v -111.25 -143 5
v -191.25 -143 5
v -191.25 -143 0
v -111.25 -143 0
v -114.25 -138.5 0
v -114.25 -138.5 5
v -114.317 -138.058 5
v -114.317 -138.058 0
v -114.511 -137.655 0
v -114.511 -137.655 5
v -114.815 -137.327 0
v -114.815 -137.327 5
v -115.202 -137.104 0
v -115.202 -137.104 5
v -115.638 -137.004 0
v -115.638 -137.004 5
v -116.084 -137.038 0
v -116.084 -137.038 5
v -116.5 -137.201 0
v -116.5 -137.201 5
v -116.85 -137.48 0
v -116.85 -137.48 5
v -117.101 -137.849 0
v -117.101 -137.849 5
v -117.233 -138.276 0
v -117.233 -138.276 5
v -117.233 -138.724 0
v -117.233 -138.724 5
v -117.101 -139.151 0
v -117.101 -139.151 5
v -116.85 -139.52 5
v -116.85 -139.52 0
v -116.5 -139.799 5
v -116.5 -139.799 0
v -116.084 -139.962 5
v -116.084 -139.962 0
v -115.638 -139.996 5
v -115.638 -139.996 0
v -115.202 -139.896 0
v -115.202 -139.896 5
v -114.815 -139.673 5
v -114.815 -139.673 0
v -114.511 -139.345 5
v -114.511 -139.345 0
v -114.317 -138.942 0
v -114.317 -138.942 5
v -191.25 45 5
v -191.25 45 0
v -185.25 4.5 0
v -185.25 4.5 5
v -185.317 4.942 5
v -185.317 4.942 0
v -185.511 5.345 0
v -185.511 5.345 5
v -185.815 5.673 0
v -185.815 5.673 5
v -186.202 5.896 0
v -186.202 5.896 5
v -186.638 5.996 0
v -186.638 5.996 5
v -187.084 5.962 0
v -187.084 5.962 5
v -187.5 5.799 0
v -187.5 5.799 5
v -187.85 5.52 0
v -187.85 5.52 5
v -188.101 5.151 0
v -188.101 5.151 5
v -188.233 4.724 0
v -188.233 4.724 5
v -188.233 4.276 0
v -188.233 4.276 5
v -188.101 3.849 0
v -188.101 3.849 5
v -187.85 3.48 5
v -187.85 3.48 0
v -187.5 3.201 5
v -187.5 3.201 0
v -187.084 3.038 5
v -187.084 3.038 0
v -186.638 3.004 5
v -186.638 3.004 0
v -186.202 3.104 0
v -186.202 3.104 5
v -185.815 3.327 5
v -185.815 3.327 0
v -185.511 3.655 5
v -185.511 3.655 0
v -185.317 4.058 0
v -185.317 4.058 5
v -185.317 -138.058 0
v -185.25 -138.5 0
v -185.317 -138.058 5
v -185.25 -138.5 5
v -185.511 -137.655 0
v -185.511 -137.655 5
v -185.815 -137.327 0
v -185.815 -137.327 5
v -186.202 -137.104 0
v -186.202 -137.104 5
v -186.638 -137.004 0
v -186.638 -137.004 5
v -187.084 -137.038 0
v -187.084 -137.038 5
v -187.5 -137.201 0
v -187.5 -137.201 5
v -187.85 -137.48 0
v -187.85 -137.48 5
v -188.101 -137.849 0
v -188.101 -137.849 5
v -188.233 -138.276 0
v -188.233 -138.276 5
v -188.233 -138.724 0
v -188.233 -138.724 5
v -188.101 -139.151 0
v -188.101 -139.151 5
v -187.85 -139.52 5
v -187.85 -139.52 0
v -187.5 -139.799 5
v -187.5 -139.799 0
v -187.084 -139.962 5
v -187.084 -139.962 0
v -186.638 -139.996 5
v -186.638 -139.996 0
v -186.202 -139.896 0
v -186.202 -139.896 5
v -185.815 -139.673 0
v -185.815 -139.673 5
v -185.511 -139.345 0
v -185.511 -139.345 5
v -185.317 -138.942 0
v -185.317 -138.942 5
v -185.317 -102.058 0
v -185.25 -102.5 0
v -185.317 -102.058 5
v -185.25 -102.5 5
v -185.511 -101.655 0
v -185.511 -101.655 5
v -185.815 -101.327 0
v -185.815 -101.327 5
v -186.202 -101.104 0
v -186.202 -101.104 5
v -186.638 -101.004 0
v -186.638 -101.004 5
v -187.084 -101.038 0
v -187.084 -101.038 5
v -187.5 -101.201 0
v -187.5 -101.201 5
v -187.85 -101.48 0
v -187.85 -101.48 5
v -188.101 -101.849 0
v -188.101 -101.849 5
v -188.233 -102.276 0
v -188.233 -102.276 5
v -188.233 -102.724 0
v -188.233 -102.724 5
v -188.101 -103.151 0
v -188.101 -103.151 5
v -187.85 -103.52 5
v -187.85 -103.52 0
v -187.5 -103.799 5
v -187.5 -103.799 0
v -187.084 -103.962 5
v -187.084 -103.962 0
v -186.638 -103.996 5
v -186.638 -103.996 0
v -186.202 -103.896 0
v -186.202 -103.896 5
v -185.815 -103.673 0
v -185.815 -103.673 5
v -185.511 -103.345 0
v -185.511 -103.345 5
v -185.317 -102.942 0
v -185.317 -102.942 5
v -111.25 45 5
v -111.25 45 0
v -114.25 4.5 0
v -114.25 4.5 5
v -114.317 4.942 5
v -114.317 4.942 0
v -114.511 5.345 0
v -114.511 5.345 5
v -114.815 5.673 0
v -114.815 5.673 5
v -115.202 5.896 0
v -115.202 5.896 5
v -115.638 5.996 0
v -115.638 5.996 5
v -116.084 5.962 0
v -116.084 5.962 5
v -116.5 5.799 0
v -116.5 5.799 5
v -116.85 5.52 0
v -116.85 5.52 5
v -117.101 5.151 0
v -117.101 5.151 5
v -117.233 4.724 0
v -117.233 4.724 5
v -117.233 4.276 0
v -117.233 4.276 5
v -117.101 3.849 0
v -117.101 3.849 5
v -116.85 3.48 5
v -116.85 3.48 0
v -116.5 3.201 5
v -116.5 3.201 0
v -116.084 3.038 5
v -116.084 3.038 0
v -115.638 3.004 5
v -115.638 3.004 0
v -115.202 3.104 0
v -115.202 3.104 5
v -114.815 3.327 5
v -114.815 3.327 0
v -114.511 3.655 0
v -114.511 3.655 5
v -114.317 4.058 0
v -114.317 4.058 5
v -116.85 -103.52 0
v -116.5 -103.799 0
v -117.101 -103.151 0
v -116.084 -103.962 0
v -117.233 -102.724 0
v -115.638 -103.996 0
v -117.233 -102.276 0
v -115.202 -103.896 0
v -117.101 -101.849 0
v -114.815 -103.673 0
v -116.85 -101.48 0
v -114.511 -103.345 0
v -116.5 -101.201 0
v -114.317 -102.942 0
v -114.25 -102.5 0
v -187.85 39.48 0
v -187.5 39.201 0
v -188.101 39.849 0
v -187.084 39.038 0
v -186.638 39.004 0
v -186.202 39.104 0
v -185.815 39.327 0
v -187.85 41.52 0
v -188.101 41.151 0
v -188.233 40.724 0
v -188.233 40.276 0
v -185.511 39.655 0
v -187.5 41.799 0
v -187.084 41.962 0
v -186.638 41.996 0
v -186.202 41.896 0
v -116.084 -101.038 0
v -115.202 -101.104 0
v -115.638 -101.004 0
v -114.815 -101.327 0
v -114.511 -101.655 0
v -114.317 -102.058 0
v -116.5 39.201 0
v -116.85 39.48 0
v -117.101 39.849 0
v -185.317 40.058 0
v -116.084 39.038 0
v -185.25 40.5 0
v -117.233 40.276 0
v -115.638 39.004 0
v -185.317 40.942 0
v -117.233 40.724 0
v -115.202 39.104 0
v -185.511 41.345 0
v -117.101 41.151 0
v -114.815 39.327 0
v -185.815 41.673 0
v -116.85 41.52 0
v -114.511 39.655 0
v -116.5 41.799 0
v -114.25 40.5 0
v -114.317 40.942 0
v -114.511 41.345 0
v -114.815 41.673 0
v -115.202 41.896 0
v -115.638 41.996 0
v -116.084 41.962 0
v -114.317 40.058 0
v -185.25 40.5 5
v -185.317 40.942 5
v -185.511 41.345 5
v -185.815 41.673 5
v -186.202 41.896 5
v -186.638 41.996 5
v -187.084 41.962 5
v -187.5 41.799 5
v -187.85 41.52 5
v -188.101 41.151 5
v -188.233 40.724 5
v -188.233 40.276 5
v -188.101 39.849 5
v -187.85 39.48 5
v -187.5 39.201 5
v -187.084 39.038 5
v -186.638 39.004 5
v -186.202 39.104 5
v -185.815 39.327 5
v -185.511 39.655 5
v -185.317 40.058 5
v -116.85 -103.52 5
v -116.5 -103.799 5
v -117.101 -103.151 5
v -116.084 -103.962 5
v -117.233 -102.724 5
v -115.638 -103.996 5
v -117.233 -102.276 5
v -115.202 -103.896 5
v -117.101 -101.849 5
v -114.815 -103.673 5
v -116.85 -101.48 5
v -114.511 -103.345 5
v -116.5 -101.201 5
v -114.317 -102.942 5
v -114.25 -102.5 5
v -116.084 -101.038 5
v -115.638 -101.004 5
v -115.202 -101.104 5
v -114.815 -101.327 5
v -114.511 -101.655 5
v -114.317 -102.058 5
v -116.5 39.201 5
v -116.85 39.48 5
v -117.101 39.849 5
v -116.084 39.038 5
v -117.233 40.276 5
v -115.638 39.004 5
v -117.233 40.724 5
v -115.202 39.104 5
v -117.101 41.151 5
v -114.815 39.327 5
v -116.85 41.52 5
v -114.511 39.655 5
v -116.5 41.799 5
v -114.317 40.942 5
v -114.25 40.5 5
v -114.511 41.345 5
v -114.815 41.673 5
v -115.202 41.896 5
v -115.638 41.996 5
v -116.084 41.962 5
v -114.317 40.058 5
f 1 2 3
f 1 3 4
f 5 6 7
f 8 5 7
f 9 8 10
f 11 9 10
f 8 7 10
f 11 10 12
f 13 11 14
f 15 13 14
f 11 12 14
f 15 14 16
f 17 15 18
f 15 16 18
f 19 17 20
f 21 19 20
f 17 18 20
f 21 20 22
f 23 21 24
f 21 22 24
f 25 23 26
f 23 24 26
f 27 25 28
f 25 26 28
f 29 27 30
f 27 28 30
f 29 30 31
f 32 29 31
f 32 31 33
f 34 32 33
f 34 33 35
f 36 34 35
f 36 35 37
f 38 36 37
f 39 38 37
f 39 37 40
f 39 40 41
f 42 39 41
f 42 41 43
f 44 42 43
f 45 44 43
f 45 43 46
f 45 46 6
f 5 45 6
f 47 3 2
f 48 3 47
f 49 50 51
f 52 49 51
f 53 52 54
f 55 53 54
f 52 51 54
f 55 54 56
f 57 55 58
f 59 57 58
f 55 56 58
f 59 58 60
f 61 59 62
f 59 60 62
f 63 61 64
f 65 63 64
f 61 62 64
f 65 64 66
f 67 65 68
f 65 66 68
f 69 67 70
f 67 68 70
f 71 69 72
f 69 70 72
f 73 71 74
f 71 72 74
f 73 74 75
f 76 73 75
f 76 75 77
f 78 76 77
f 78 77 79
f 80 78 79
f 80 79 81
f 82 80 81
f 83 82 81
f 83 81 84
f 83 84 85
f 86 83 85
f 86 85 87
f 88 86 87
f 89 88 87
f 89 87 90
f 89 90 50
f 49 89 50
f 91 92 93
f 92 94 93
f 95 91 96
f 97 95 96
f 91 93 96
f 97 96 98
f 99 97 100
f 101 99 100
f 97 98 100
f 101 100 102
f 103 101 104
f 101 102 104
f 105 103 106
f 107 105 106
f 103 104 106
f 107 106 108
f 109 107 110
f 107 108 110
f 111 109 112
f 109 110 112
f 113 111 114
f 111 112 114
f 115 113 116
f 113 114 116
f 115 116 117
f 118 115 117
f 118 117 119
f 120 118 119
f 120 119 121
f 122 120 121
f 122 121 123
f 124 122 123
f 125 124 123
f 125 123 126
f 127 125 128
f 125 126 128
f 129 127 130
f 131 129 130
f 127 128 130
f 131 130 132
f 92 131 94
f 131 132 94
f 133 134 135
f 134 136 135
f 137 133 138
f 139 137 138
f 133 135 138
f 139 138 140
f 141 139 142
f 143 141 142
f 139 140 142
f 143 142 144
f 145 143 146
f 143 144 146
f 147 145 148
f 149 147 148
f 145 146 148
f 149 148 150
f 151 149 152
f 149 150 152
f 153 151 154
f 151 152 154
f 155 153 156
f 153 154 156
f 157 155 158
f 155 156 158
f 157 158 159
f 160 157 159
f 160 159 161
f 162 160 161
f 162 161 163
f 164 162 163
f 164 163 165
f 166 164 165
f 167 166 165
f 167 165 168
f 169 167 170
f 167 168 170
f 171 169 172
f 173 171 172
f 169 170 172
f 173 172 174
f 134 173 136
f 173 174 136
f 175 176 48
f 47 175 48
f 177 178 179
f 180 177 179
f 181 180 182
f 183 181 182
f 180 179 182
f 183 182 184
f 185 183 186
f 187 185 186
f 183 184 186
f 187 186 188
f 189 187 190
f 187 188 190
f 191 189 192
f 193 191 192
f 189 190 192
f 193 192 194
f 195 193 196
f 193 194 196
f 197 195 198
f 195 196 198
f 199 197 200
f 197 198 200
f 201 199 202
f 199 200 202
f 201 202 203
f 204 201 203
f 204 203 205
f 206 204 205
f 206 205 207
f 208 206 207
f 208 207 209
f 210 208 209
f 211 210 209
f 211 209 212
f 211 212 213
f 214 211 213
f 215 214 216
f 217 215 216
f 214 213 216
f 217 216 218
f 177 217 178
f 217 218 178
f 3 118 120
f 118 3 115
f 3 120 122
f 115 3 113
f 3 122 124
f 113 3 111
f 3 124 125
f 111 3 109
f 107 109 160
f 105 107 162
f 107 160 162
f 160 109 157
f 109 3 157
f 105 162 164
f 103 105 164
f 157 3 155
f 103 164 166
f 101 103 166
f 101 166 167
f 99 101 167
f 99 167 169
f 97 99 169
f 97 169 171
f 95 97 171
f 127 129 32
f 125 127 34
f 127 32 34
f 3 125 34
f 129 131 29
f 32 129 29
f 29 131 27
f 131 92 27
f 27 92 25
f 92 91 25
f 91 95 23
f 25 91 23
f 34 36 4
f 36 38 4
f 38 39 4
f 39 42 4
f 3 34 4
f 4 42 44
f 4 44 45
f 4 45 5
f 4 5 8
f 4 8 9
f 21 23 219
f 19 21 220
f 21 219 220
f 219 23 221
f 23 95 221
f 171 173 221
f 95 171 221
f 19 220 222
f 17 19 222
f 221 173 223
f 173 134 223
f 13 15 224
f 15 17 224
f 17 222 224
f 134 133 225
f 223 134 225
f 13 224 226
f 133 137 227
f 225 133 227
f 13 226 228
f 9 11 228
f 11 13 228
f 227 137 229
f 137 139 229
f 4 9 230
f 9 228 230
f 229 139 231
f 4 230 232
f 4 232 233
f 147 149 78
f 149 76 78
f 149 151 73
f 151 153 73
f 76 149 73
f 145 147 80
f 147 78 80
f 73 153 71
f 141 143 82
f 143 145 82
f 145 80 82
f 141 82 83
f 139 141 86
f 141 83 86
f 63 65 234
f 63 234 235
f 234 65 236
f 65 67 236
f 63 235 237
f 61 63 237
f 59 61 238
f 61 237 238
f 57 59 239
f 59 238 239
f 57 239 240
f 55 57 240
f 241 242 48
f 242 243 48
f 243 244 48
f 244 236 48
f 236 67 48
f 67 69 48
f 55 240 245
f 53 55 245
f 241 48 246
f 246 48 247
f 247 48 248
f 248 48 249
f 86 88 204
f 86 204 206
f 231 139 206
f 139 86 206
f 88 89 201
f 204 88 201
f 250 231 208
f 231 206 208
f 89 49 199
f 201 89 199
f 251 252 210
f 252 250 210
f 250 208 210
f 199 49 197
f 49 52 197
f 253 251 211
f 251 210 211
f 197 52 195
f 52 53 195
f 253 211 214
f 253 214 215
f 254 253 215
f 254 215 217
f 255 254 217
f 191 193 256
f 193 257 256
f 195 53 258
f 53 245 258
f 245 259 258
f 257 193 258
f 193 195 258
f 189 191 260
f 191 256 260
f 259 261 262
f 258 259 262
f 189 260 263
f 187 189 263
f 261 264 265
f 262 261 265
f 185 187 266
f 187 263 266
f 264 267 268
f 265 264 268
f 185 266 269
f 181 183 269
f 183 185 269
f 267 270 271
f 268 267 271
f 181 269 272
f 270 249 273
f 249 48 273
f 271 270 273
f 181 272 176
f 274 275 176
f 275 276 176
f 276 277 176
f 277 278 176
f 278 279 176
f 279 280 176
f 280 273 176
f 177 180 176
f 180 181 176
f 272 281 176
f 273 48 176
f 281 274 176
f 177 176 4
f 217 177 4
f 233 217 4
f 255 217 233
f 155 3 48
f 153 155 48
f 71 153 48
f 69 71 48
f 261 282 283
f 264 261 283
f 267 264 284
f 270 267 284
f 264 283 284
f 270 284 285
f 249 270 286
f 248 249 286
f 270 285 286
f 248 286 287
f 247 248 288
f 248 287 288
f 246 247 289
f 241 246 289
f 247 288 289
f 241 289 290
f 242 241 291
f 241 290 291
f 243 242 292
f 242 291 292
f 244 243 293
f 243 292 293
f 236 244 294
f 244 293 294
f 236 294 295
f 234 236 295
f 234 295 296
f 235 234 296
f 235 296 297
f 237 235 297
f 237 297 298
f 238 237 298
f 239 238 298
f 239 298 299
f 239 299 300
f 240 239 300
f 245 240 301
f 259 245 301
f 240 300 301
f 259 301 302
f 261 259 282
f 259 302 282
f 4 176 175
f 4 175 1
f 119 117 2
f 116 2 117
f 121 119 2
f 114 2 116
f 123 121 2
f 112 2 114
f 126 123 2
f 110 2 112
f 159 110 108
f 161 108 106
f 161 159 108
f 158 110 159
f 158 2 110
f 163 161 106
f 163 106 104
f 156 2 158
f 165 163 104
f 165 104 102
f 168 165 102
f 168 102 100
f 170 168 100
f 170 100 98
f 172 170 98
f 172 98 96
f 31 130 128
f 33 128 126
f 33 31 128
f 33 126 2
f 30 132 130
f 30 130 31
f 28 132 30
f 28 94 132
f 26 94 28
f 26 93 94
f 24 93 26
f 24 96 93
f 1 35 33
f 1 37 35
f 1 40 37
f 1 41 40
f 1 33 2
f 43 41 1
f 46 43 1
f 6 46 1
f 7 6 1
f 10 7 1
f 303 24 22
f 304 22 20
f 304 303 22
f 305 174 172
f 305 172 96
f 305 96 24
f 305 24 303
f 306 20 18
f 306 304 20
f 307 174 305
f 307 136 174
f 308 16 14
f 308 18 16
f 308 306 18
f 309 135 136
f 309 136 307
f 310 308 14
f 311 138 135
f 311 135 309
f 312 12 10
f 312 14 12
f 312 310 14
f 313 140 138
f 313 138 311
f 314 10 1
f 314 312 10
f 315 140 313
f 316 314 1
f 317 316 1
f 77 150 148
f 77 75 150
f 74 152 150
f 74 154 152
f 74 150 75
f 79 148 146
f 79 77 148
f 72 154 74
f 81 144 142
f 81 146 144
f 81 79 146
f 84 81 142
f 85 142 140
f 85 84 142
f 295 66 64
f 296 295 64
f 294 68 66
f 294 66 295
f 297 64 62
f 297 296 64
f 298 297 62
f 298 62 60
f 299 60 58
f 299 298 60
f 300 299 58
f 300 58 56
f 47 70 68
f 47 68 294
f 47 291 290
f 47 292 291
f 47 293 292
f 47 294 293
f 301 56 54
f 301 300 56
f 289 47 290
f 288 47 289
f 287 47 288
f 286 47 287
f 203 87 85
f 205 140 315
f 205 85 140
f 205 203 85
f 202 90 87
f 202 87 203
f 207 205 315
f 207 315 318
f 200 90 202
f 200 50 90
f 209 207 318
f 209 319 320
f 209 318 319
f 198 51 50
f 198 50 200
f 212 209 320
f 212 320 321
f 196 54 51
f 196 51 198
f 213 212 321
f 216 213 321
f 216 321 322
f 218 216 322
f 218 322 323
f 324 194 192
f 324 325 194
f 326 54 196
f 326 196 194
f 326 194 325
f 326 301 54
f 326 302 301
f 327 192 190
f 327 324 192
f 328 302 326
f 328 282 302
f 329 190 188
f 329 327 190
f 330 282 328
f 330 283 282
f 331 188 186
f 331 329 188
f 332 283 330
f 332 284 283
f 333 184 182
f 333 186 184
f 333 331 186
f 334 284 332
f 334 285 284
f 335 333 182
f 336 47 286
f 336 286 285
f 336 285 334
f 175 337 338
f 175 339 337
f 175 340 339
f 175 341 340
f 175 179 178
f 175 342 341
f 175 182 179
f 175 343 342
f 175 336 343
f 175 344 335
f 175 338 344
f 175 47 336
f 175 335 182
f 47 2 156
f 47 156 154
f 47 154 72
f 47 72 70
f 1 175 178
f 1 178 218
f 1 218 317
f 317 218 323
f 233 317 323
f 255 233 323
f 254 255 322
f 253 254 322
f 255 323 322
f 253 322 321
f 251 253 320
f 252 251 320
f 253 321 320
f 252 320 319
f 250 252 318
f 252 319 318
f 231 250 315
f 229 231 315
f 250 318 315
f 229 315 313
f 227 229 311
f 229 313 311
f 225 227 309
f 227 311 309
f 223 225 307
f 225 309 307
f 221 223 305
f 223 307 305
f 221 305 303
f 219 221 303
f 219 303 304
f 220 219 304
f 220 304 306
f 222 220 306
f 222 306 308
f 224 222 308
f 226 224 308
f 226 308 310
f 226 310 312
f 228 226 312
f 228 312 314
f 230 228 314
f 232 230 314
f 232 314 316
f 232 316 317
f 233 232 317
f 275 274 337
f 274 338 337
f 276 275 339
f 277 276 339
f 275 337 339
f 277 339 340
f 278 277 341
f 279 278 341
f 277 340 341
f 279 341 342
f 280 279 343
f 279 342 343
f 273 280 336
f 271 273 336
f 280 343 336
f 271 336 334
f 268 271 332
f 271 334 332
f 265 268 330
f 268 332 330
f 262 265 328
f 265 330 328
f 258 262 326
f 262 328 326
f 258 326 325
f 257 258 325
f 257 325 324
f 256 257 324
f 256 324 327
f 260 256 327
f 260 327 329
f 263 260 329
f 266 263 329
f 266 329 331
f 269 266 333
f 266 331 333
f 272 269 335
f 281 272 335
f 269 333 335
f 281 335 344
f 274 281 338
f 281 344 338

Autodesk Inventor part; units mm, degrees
ref_plane "YZ Plane" through (0, 0, 0) normal (1, 0, 0) x (0, 1, 0)
ref_plane "XZ Plane" through (0, 0, 0) normal (0, 1, 0) x (-1, 0, 0)
ref_plane "Work Plane1" through (0, 0, 0) normal (0, 0, 1) x (1, 0, 0)
sketch "Sketch1" plane through (0, 0, 0) normal (0, 0, 1) x (1, 0, 0)
  arc A0 (-290.5, 45) -> (-292.5, 43) centre (-290.5, 43) ccw projected
  line L0 (-292.5, 1) -> (-292.5, 43) projected
  line L1 (-10, 1) -> (-292.5, 1) projected
  line L2 (-10, 1) -> (-10, 43) projected
  arc A1 (-10, 43) -> (-12, 45) centre (-12, 43) ccw projected
  line L3 (-12, 45) -> (-290.5, 45) projected
  circle A2 centre (-205.5, 4.5) radius 1.4 projected
  circle A3 centre (-288.25, 40.5) radius 1.4 projected
  circle A4 centre (-288.25, 4.5) radius 1.4 projected
  circle A5 centre (-97, 40.5) radius 1.4 projected
  circle A6 centre (-97, 4.5) radius 1.4 projected
  circle A7 centre (-14.25, 40.5) radius 1.4 projected
  circle A8 centre (-14.25, 4.5) radius 1.4 projected
  circle A9 centre (-205.5, 40.5) radius 1.4 projected
  line L4 (-292.5, 22) -> (-10, 22) construction
  line L5 (-151.25, 45) -> (-151.25, 1) construction
  line L6 (-191.25, 45) -> (-111.25, 45)
  line L7 (-111.25, 45) -> (-111.25, -1)
  line L8 (-111.25, -1) -> (-191.25, -1)
  line L9 (-191.25, -1) -> (-191.25, 45)
  line L10 (-191.25, 45) -> (-111.25, -1) construction
  line L11 (-111.25, 45) -> (-191.25, -1) construction
  point P0 (0, 0)
  point P1 (-151.25, 22)
  point P2 (-191.25, 1)
  point P3 (-111.25, 1)
  dimension "d0" = 80
  dimension "d1" = 46
extrude "Extrusion1" add sketch "Sketch1" along normal blind 5 contours L3 L7 L1 L9
sketch "Sketch2" plane through (-191.25, 1, 0) normal (0, -1, 0) x (1, 0, 0)
  line L0 (0, 0) -> (80, 0) projected
  line L1 (80, 0) -> (80, 5) projected
  line L2 (0, 5) -> (80, 5) projected
  line L3 (0, 0) -> (0, 5) projected
  point P0 (191.25, 0)
ref_plane "Work Plane2" through (-292.5, -143, -256) normal (0, -1, 0) x (1, 0, 0)
extrude "Extrusion2" add sketch "Sketch2" along normal up to surface (144 mm away)
sketch "Sketch3" plane through (0, 0, 5) normal (0, 0, 1) x (1, 0, 0)
  arc A0 (-290.5, 45) -> (-292.5, 43) centre (-290.5, 43) ccw projected
  line L0 (-292.5, 1) -> (-292.5, 43) projected
  line L1 (-10, 1) -> (-292.5, 1) projected
  line L2 (-10, 1) -> (-10, 43) projected
  arc A1 (-10, 43) -> (-12, 45) centre (-12, 43) ccw projected
  line L3 (-12, 45) -> (-290.5, 45) projected
  circle A2 centre (-205.5, 4.5) radius 1.4 projected
  circle A3 centre (-288.25, 40.5) radius 1.4 projected
  circle A4 centre (-288.25, 4.5) radius 1.4 projected
  circle A5 centre (-97, 40.5) radius 1.4 projected
  circle A6 centre (-97, 4.5) radius 1.4 projected
  circle A7 centre (-14.25, 40.5) radius 1.4 projected
  circle A8 centre (-14.25, 4.5) radius 1.4 projected
  circle A9 centre (-205.5, 40.5) radius 1.4 projected
  line L4 (-111.25, 45) -> (-111.25, -143) projected
  line L5 (-111.25, 45) -> (-191.25, 45) projected
  line L6 (-191.25, 45) -> (-191.25, -143) projected
  line L7 (-191.25, -143) -> (-111.25, -143) projected
  line L8 (-288.25, 40.5) -> (-14.25, 40.5) construction
  line L9 (-111.25, 45) -> (-191.25, 45) construction
  line L10 (-186.75, 45) -> (-186.75, 1) construction
  circle A10 centre (-186.75, 40.5) radius 1.5
  circle A11 centre (-115.75, 40.5) radius 1.5
  circle A12 centre (-186.75, 4.5) radius 1.5
  circle A13 centre (-115.75, 4.5) radius 1.5
  circle A14 centre (-186.75, -138.5) radius 1.5
  circle A15 centre (-115.75, -138.5) radius 1.5
  circle A16 centre (-115.75, -102.5) radius 1.5
  circle A17 centre (-186.75, -102.5) radius 1.5
  point P0 (0, 0)
  dimension "d6" = 4.5
  dimension "d7" = 4.5
  dimension "d8" = 3
  dimension "d11" = 71
  dimension "d14" = 36
  dimension "d17" = 188
  dimension "d20" = 143
extrude "Extrusion3" cut sketch "Sketch3" against normal through all contours A10 | A11 | A12 | A13 | A14 | A15 | A16 | A17
properties part number "upper-lower form connector"
